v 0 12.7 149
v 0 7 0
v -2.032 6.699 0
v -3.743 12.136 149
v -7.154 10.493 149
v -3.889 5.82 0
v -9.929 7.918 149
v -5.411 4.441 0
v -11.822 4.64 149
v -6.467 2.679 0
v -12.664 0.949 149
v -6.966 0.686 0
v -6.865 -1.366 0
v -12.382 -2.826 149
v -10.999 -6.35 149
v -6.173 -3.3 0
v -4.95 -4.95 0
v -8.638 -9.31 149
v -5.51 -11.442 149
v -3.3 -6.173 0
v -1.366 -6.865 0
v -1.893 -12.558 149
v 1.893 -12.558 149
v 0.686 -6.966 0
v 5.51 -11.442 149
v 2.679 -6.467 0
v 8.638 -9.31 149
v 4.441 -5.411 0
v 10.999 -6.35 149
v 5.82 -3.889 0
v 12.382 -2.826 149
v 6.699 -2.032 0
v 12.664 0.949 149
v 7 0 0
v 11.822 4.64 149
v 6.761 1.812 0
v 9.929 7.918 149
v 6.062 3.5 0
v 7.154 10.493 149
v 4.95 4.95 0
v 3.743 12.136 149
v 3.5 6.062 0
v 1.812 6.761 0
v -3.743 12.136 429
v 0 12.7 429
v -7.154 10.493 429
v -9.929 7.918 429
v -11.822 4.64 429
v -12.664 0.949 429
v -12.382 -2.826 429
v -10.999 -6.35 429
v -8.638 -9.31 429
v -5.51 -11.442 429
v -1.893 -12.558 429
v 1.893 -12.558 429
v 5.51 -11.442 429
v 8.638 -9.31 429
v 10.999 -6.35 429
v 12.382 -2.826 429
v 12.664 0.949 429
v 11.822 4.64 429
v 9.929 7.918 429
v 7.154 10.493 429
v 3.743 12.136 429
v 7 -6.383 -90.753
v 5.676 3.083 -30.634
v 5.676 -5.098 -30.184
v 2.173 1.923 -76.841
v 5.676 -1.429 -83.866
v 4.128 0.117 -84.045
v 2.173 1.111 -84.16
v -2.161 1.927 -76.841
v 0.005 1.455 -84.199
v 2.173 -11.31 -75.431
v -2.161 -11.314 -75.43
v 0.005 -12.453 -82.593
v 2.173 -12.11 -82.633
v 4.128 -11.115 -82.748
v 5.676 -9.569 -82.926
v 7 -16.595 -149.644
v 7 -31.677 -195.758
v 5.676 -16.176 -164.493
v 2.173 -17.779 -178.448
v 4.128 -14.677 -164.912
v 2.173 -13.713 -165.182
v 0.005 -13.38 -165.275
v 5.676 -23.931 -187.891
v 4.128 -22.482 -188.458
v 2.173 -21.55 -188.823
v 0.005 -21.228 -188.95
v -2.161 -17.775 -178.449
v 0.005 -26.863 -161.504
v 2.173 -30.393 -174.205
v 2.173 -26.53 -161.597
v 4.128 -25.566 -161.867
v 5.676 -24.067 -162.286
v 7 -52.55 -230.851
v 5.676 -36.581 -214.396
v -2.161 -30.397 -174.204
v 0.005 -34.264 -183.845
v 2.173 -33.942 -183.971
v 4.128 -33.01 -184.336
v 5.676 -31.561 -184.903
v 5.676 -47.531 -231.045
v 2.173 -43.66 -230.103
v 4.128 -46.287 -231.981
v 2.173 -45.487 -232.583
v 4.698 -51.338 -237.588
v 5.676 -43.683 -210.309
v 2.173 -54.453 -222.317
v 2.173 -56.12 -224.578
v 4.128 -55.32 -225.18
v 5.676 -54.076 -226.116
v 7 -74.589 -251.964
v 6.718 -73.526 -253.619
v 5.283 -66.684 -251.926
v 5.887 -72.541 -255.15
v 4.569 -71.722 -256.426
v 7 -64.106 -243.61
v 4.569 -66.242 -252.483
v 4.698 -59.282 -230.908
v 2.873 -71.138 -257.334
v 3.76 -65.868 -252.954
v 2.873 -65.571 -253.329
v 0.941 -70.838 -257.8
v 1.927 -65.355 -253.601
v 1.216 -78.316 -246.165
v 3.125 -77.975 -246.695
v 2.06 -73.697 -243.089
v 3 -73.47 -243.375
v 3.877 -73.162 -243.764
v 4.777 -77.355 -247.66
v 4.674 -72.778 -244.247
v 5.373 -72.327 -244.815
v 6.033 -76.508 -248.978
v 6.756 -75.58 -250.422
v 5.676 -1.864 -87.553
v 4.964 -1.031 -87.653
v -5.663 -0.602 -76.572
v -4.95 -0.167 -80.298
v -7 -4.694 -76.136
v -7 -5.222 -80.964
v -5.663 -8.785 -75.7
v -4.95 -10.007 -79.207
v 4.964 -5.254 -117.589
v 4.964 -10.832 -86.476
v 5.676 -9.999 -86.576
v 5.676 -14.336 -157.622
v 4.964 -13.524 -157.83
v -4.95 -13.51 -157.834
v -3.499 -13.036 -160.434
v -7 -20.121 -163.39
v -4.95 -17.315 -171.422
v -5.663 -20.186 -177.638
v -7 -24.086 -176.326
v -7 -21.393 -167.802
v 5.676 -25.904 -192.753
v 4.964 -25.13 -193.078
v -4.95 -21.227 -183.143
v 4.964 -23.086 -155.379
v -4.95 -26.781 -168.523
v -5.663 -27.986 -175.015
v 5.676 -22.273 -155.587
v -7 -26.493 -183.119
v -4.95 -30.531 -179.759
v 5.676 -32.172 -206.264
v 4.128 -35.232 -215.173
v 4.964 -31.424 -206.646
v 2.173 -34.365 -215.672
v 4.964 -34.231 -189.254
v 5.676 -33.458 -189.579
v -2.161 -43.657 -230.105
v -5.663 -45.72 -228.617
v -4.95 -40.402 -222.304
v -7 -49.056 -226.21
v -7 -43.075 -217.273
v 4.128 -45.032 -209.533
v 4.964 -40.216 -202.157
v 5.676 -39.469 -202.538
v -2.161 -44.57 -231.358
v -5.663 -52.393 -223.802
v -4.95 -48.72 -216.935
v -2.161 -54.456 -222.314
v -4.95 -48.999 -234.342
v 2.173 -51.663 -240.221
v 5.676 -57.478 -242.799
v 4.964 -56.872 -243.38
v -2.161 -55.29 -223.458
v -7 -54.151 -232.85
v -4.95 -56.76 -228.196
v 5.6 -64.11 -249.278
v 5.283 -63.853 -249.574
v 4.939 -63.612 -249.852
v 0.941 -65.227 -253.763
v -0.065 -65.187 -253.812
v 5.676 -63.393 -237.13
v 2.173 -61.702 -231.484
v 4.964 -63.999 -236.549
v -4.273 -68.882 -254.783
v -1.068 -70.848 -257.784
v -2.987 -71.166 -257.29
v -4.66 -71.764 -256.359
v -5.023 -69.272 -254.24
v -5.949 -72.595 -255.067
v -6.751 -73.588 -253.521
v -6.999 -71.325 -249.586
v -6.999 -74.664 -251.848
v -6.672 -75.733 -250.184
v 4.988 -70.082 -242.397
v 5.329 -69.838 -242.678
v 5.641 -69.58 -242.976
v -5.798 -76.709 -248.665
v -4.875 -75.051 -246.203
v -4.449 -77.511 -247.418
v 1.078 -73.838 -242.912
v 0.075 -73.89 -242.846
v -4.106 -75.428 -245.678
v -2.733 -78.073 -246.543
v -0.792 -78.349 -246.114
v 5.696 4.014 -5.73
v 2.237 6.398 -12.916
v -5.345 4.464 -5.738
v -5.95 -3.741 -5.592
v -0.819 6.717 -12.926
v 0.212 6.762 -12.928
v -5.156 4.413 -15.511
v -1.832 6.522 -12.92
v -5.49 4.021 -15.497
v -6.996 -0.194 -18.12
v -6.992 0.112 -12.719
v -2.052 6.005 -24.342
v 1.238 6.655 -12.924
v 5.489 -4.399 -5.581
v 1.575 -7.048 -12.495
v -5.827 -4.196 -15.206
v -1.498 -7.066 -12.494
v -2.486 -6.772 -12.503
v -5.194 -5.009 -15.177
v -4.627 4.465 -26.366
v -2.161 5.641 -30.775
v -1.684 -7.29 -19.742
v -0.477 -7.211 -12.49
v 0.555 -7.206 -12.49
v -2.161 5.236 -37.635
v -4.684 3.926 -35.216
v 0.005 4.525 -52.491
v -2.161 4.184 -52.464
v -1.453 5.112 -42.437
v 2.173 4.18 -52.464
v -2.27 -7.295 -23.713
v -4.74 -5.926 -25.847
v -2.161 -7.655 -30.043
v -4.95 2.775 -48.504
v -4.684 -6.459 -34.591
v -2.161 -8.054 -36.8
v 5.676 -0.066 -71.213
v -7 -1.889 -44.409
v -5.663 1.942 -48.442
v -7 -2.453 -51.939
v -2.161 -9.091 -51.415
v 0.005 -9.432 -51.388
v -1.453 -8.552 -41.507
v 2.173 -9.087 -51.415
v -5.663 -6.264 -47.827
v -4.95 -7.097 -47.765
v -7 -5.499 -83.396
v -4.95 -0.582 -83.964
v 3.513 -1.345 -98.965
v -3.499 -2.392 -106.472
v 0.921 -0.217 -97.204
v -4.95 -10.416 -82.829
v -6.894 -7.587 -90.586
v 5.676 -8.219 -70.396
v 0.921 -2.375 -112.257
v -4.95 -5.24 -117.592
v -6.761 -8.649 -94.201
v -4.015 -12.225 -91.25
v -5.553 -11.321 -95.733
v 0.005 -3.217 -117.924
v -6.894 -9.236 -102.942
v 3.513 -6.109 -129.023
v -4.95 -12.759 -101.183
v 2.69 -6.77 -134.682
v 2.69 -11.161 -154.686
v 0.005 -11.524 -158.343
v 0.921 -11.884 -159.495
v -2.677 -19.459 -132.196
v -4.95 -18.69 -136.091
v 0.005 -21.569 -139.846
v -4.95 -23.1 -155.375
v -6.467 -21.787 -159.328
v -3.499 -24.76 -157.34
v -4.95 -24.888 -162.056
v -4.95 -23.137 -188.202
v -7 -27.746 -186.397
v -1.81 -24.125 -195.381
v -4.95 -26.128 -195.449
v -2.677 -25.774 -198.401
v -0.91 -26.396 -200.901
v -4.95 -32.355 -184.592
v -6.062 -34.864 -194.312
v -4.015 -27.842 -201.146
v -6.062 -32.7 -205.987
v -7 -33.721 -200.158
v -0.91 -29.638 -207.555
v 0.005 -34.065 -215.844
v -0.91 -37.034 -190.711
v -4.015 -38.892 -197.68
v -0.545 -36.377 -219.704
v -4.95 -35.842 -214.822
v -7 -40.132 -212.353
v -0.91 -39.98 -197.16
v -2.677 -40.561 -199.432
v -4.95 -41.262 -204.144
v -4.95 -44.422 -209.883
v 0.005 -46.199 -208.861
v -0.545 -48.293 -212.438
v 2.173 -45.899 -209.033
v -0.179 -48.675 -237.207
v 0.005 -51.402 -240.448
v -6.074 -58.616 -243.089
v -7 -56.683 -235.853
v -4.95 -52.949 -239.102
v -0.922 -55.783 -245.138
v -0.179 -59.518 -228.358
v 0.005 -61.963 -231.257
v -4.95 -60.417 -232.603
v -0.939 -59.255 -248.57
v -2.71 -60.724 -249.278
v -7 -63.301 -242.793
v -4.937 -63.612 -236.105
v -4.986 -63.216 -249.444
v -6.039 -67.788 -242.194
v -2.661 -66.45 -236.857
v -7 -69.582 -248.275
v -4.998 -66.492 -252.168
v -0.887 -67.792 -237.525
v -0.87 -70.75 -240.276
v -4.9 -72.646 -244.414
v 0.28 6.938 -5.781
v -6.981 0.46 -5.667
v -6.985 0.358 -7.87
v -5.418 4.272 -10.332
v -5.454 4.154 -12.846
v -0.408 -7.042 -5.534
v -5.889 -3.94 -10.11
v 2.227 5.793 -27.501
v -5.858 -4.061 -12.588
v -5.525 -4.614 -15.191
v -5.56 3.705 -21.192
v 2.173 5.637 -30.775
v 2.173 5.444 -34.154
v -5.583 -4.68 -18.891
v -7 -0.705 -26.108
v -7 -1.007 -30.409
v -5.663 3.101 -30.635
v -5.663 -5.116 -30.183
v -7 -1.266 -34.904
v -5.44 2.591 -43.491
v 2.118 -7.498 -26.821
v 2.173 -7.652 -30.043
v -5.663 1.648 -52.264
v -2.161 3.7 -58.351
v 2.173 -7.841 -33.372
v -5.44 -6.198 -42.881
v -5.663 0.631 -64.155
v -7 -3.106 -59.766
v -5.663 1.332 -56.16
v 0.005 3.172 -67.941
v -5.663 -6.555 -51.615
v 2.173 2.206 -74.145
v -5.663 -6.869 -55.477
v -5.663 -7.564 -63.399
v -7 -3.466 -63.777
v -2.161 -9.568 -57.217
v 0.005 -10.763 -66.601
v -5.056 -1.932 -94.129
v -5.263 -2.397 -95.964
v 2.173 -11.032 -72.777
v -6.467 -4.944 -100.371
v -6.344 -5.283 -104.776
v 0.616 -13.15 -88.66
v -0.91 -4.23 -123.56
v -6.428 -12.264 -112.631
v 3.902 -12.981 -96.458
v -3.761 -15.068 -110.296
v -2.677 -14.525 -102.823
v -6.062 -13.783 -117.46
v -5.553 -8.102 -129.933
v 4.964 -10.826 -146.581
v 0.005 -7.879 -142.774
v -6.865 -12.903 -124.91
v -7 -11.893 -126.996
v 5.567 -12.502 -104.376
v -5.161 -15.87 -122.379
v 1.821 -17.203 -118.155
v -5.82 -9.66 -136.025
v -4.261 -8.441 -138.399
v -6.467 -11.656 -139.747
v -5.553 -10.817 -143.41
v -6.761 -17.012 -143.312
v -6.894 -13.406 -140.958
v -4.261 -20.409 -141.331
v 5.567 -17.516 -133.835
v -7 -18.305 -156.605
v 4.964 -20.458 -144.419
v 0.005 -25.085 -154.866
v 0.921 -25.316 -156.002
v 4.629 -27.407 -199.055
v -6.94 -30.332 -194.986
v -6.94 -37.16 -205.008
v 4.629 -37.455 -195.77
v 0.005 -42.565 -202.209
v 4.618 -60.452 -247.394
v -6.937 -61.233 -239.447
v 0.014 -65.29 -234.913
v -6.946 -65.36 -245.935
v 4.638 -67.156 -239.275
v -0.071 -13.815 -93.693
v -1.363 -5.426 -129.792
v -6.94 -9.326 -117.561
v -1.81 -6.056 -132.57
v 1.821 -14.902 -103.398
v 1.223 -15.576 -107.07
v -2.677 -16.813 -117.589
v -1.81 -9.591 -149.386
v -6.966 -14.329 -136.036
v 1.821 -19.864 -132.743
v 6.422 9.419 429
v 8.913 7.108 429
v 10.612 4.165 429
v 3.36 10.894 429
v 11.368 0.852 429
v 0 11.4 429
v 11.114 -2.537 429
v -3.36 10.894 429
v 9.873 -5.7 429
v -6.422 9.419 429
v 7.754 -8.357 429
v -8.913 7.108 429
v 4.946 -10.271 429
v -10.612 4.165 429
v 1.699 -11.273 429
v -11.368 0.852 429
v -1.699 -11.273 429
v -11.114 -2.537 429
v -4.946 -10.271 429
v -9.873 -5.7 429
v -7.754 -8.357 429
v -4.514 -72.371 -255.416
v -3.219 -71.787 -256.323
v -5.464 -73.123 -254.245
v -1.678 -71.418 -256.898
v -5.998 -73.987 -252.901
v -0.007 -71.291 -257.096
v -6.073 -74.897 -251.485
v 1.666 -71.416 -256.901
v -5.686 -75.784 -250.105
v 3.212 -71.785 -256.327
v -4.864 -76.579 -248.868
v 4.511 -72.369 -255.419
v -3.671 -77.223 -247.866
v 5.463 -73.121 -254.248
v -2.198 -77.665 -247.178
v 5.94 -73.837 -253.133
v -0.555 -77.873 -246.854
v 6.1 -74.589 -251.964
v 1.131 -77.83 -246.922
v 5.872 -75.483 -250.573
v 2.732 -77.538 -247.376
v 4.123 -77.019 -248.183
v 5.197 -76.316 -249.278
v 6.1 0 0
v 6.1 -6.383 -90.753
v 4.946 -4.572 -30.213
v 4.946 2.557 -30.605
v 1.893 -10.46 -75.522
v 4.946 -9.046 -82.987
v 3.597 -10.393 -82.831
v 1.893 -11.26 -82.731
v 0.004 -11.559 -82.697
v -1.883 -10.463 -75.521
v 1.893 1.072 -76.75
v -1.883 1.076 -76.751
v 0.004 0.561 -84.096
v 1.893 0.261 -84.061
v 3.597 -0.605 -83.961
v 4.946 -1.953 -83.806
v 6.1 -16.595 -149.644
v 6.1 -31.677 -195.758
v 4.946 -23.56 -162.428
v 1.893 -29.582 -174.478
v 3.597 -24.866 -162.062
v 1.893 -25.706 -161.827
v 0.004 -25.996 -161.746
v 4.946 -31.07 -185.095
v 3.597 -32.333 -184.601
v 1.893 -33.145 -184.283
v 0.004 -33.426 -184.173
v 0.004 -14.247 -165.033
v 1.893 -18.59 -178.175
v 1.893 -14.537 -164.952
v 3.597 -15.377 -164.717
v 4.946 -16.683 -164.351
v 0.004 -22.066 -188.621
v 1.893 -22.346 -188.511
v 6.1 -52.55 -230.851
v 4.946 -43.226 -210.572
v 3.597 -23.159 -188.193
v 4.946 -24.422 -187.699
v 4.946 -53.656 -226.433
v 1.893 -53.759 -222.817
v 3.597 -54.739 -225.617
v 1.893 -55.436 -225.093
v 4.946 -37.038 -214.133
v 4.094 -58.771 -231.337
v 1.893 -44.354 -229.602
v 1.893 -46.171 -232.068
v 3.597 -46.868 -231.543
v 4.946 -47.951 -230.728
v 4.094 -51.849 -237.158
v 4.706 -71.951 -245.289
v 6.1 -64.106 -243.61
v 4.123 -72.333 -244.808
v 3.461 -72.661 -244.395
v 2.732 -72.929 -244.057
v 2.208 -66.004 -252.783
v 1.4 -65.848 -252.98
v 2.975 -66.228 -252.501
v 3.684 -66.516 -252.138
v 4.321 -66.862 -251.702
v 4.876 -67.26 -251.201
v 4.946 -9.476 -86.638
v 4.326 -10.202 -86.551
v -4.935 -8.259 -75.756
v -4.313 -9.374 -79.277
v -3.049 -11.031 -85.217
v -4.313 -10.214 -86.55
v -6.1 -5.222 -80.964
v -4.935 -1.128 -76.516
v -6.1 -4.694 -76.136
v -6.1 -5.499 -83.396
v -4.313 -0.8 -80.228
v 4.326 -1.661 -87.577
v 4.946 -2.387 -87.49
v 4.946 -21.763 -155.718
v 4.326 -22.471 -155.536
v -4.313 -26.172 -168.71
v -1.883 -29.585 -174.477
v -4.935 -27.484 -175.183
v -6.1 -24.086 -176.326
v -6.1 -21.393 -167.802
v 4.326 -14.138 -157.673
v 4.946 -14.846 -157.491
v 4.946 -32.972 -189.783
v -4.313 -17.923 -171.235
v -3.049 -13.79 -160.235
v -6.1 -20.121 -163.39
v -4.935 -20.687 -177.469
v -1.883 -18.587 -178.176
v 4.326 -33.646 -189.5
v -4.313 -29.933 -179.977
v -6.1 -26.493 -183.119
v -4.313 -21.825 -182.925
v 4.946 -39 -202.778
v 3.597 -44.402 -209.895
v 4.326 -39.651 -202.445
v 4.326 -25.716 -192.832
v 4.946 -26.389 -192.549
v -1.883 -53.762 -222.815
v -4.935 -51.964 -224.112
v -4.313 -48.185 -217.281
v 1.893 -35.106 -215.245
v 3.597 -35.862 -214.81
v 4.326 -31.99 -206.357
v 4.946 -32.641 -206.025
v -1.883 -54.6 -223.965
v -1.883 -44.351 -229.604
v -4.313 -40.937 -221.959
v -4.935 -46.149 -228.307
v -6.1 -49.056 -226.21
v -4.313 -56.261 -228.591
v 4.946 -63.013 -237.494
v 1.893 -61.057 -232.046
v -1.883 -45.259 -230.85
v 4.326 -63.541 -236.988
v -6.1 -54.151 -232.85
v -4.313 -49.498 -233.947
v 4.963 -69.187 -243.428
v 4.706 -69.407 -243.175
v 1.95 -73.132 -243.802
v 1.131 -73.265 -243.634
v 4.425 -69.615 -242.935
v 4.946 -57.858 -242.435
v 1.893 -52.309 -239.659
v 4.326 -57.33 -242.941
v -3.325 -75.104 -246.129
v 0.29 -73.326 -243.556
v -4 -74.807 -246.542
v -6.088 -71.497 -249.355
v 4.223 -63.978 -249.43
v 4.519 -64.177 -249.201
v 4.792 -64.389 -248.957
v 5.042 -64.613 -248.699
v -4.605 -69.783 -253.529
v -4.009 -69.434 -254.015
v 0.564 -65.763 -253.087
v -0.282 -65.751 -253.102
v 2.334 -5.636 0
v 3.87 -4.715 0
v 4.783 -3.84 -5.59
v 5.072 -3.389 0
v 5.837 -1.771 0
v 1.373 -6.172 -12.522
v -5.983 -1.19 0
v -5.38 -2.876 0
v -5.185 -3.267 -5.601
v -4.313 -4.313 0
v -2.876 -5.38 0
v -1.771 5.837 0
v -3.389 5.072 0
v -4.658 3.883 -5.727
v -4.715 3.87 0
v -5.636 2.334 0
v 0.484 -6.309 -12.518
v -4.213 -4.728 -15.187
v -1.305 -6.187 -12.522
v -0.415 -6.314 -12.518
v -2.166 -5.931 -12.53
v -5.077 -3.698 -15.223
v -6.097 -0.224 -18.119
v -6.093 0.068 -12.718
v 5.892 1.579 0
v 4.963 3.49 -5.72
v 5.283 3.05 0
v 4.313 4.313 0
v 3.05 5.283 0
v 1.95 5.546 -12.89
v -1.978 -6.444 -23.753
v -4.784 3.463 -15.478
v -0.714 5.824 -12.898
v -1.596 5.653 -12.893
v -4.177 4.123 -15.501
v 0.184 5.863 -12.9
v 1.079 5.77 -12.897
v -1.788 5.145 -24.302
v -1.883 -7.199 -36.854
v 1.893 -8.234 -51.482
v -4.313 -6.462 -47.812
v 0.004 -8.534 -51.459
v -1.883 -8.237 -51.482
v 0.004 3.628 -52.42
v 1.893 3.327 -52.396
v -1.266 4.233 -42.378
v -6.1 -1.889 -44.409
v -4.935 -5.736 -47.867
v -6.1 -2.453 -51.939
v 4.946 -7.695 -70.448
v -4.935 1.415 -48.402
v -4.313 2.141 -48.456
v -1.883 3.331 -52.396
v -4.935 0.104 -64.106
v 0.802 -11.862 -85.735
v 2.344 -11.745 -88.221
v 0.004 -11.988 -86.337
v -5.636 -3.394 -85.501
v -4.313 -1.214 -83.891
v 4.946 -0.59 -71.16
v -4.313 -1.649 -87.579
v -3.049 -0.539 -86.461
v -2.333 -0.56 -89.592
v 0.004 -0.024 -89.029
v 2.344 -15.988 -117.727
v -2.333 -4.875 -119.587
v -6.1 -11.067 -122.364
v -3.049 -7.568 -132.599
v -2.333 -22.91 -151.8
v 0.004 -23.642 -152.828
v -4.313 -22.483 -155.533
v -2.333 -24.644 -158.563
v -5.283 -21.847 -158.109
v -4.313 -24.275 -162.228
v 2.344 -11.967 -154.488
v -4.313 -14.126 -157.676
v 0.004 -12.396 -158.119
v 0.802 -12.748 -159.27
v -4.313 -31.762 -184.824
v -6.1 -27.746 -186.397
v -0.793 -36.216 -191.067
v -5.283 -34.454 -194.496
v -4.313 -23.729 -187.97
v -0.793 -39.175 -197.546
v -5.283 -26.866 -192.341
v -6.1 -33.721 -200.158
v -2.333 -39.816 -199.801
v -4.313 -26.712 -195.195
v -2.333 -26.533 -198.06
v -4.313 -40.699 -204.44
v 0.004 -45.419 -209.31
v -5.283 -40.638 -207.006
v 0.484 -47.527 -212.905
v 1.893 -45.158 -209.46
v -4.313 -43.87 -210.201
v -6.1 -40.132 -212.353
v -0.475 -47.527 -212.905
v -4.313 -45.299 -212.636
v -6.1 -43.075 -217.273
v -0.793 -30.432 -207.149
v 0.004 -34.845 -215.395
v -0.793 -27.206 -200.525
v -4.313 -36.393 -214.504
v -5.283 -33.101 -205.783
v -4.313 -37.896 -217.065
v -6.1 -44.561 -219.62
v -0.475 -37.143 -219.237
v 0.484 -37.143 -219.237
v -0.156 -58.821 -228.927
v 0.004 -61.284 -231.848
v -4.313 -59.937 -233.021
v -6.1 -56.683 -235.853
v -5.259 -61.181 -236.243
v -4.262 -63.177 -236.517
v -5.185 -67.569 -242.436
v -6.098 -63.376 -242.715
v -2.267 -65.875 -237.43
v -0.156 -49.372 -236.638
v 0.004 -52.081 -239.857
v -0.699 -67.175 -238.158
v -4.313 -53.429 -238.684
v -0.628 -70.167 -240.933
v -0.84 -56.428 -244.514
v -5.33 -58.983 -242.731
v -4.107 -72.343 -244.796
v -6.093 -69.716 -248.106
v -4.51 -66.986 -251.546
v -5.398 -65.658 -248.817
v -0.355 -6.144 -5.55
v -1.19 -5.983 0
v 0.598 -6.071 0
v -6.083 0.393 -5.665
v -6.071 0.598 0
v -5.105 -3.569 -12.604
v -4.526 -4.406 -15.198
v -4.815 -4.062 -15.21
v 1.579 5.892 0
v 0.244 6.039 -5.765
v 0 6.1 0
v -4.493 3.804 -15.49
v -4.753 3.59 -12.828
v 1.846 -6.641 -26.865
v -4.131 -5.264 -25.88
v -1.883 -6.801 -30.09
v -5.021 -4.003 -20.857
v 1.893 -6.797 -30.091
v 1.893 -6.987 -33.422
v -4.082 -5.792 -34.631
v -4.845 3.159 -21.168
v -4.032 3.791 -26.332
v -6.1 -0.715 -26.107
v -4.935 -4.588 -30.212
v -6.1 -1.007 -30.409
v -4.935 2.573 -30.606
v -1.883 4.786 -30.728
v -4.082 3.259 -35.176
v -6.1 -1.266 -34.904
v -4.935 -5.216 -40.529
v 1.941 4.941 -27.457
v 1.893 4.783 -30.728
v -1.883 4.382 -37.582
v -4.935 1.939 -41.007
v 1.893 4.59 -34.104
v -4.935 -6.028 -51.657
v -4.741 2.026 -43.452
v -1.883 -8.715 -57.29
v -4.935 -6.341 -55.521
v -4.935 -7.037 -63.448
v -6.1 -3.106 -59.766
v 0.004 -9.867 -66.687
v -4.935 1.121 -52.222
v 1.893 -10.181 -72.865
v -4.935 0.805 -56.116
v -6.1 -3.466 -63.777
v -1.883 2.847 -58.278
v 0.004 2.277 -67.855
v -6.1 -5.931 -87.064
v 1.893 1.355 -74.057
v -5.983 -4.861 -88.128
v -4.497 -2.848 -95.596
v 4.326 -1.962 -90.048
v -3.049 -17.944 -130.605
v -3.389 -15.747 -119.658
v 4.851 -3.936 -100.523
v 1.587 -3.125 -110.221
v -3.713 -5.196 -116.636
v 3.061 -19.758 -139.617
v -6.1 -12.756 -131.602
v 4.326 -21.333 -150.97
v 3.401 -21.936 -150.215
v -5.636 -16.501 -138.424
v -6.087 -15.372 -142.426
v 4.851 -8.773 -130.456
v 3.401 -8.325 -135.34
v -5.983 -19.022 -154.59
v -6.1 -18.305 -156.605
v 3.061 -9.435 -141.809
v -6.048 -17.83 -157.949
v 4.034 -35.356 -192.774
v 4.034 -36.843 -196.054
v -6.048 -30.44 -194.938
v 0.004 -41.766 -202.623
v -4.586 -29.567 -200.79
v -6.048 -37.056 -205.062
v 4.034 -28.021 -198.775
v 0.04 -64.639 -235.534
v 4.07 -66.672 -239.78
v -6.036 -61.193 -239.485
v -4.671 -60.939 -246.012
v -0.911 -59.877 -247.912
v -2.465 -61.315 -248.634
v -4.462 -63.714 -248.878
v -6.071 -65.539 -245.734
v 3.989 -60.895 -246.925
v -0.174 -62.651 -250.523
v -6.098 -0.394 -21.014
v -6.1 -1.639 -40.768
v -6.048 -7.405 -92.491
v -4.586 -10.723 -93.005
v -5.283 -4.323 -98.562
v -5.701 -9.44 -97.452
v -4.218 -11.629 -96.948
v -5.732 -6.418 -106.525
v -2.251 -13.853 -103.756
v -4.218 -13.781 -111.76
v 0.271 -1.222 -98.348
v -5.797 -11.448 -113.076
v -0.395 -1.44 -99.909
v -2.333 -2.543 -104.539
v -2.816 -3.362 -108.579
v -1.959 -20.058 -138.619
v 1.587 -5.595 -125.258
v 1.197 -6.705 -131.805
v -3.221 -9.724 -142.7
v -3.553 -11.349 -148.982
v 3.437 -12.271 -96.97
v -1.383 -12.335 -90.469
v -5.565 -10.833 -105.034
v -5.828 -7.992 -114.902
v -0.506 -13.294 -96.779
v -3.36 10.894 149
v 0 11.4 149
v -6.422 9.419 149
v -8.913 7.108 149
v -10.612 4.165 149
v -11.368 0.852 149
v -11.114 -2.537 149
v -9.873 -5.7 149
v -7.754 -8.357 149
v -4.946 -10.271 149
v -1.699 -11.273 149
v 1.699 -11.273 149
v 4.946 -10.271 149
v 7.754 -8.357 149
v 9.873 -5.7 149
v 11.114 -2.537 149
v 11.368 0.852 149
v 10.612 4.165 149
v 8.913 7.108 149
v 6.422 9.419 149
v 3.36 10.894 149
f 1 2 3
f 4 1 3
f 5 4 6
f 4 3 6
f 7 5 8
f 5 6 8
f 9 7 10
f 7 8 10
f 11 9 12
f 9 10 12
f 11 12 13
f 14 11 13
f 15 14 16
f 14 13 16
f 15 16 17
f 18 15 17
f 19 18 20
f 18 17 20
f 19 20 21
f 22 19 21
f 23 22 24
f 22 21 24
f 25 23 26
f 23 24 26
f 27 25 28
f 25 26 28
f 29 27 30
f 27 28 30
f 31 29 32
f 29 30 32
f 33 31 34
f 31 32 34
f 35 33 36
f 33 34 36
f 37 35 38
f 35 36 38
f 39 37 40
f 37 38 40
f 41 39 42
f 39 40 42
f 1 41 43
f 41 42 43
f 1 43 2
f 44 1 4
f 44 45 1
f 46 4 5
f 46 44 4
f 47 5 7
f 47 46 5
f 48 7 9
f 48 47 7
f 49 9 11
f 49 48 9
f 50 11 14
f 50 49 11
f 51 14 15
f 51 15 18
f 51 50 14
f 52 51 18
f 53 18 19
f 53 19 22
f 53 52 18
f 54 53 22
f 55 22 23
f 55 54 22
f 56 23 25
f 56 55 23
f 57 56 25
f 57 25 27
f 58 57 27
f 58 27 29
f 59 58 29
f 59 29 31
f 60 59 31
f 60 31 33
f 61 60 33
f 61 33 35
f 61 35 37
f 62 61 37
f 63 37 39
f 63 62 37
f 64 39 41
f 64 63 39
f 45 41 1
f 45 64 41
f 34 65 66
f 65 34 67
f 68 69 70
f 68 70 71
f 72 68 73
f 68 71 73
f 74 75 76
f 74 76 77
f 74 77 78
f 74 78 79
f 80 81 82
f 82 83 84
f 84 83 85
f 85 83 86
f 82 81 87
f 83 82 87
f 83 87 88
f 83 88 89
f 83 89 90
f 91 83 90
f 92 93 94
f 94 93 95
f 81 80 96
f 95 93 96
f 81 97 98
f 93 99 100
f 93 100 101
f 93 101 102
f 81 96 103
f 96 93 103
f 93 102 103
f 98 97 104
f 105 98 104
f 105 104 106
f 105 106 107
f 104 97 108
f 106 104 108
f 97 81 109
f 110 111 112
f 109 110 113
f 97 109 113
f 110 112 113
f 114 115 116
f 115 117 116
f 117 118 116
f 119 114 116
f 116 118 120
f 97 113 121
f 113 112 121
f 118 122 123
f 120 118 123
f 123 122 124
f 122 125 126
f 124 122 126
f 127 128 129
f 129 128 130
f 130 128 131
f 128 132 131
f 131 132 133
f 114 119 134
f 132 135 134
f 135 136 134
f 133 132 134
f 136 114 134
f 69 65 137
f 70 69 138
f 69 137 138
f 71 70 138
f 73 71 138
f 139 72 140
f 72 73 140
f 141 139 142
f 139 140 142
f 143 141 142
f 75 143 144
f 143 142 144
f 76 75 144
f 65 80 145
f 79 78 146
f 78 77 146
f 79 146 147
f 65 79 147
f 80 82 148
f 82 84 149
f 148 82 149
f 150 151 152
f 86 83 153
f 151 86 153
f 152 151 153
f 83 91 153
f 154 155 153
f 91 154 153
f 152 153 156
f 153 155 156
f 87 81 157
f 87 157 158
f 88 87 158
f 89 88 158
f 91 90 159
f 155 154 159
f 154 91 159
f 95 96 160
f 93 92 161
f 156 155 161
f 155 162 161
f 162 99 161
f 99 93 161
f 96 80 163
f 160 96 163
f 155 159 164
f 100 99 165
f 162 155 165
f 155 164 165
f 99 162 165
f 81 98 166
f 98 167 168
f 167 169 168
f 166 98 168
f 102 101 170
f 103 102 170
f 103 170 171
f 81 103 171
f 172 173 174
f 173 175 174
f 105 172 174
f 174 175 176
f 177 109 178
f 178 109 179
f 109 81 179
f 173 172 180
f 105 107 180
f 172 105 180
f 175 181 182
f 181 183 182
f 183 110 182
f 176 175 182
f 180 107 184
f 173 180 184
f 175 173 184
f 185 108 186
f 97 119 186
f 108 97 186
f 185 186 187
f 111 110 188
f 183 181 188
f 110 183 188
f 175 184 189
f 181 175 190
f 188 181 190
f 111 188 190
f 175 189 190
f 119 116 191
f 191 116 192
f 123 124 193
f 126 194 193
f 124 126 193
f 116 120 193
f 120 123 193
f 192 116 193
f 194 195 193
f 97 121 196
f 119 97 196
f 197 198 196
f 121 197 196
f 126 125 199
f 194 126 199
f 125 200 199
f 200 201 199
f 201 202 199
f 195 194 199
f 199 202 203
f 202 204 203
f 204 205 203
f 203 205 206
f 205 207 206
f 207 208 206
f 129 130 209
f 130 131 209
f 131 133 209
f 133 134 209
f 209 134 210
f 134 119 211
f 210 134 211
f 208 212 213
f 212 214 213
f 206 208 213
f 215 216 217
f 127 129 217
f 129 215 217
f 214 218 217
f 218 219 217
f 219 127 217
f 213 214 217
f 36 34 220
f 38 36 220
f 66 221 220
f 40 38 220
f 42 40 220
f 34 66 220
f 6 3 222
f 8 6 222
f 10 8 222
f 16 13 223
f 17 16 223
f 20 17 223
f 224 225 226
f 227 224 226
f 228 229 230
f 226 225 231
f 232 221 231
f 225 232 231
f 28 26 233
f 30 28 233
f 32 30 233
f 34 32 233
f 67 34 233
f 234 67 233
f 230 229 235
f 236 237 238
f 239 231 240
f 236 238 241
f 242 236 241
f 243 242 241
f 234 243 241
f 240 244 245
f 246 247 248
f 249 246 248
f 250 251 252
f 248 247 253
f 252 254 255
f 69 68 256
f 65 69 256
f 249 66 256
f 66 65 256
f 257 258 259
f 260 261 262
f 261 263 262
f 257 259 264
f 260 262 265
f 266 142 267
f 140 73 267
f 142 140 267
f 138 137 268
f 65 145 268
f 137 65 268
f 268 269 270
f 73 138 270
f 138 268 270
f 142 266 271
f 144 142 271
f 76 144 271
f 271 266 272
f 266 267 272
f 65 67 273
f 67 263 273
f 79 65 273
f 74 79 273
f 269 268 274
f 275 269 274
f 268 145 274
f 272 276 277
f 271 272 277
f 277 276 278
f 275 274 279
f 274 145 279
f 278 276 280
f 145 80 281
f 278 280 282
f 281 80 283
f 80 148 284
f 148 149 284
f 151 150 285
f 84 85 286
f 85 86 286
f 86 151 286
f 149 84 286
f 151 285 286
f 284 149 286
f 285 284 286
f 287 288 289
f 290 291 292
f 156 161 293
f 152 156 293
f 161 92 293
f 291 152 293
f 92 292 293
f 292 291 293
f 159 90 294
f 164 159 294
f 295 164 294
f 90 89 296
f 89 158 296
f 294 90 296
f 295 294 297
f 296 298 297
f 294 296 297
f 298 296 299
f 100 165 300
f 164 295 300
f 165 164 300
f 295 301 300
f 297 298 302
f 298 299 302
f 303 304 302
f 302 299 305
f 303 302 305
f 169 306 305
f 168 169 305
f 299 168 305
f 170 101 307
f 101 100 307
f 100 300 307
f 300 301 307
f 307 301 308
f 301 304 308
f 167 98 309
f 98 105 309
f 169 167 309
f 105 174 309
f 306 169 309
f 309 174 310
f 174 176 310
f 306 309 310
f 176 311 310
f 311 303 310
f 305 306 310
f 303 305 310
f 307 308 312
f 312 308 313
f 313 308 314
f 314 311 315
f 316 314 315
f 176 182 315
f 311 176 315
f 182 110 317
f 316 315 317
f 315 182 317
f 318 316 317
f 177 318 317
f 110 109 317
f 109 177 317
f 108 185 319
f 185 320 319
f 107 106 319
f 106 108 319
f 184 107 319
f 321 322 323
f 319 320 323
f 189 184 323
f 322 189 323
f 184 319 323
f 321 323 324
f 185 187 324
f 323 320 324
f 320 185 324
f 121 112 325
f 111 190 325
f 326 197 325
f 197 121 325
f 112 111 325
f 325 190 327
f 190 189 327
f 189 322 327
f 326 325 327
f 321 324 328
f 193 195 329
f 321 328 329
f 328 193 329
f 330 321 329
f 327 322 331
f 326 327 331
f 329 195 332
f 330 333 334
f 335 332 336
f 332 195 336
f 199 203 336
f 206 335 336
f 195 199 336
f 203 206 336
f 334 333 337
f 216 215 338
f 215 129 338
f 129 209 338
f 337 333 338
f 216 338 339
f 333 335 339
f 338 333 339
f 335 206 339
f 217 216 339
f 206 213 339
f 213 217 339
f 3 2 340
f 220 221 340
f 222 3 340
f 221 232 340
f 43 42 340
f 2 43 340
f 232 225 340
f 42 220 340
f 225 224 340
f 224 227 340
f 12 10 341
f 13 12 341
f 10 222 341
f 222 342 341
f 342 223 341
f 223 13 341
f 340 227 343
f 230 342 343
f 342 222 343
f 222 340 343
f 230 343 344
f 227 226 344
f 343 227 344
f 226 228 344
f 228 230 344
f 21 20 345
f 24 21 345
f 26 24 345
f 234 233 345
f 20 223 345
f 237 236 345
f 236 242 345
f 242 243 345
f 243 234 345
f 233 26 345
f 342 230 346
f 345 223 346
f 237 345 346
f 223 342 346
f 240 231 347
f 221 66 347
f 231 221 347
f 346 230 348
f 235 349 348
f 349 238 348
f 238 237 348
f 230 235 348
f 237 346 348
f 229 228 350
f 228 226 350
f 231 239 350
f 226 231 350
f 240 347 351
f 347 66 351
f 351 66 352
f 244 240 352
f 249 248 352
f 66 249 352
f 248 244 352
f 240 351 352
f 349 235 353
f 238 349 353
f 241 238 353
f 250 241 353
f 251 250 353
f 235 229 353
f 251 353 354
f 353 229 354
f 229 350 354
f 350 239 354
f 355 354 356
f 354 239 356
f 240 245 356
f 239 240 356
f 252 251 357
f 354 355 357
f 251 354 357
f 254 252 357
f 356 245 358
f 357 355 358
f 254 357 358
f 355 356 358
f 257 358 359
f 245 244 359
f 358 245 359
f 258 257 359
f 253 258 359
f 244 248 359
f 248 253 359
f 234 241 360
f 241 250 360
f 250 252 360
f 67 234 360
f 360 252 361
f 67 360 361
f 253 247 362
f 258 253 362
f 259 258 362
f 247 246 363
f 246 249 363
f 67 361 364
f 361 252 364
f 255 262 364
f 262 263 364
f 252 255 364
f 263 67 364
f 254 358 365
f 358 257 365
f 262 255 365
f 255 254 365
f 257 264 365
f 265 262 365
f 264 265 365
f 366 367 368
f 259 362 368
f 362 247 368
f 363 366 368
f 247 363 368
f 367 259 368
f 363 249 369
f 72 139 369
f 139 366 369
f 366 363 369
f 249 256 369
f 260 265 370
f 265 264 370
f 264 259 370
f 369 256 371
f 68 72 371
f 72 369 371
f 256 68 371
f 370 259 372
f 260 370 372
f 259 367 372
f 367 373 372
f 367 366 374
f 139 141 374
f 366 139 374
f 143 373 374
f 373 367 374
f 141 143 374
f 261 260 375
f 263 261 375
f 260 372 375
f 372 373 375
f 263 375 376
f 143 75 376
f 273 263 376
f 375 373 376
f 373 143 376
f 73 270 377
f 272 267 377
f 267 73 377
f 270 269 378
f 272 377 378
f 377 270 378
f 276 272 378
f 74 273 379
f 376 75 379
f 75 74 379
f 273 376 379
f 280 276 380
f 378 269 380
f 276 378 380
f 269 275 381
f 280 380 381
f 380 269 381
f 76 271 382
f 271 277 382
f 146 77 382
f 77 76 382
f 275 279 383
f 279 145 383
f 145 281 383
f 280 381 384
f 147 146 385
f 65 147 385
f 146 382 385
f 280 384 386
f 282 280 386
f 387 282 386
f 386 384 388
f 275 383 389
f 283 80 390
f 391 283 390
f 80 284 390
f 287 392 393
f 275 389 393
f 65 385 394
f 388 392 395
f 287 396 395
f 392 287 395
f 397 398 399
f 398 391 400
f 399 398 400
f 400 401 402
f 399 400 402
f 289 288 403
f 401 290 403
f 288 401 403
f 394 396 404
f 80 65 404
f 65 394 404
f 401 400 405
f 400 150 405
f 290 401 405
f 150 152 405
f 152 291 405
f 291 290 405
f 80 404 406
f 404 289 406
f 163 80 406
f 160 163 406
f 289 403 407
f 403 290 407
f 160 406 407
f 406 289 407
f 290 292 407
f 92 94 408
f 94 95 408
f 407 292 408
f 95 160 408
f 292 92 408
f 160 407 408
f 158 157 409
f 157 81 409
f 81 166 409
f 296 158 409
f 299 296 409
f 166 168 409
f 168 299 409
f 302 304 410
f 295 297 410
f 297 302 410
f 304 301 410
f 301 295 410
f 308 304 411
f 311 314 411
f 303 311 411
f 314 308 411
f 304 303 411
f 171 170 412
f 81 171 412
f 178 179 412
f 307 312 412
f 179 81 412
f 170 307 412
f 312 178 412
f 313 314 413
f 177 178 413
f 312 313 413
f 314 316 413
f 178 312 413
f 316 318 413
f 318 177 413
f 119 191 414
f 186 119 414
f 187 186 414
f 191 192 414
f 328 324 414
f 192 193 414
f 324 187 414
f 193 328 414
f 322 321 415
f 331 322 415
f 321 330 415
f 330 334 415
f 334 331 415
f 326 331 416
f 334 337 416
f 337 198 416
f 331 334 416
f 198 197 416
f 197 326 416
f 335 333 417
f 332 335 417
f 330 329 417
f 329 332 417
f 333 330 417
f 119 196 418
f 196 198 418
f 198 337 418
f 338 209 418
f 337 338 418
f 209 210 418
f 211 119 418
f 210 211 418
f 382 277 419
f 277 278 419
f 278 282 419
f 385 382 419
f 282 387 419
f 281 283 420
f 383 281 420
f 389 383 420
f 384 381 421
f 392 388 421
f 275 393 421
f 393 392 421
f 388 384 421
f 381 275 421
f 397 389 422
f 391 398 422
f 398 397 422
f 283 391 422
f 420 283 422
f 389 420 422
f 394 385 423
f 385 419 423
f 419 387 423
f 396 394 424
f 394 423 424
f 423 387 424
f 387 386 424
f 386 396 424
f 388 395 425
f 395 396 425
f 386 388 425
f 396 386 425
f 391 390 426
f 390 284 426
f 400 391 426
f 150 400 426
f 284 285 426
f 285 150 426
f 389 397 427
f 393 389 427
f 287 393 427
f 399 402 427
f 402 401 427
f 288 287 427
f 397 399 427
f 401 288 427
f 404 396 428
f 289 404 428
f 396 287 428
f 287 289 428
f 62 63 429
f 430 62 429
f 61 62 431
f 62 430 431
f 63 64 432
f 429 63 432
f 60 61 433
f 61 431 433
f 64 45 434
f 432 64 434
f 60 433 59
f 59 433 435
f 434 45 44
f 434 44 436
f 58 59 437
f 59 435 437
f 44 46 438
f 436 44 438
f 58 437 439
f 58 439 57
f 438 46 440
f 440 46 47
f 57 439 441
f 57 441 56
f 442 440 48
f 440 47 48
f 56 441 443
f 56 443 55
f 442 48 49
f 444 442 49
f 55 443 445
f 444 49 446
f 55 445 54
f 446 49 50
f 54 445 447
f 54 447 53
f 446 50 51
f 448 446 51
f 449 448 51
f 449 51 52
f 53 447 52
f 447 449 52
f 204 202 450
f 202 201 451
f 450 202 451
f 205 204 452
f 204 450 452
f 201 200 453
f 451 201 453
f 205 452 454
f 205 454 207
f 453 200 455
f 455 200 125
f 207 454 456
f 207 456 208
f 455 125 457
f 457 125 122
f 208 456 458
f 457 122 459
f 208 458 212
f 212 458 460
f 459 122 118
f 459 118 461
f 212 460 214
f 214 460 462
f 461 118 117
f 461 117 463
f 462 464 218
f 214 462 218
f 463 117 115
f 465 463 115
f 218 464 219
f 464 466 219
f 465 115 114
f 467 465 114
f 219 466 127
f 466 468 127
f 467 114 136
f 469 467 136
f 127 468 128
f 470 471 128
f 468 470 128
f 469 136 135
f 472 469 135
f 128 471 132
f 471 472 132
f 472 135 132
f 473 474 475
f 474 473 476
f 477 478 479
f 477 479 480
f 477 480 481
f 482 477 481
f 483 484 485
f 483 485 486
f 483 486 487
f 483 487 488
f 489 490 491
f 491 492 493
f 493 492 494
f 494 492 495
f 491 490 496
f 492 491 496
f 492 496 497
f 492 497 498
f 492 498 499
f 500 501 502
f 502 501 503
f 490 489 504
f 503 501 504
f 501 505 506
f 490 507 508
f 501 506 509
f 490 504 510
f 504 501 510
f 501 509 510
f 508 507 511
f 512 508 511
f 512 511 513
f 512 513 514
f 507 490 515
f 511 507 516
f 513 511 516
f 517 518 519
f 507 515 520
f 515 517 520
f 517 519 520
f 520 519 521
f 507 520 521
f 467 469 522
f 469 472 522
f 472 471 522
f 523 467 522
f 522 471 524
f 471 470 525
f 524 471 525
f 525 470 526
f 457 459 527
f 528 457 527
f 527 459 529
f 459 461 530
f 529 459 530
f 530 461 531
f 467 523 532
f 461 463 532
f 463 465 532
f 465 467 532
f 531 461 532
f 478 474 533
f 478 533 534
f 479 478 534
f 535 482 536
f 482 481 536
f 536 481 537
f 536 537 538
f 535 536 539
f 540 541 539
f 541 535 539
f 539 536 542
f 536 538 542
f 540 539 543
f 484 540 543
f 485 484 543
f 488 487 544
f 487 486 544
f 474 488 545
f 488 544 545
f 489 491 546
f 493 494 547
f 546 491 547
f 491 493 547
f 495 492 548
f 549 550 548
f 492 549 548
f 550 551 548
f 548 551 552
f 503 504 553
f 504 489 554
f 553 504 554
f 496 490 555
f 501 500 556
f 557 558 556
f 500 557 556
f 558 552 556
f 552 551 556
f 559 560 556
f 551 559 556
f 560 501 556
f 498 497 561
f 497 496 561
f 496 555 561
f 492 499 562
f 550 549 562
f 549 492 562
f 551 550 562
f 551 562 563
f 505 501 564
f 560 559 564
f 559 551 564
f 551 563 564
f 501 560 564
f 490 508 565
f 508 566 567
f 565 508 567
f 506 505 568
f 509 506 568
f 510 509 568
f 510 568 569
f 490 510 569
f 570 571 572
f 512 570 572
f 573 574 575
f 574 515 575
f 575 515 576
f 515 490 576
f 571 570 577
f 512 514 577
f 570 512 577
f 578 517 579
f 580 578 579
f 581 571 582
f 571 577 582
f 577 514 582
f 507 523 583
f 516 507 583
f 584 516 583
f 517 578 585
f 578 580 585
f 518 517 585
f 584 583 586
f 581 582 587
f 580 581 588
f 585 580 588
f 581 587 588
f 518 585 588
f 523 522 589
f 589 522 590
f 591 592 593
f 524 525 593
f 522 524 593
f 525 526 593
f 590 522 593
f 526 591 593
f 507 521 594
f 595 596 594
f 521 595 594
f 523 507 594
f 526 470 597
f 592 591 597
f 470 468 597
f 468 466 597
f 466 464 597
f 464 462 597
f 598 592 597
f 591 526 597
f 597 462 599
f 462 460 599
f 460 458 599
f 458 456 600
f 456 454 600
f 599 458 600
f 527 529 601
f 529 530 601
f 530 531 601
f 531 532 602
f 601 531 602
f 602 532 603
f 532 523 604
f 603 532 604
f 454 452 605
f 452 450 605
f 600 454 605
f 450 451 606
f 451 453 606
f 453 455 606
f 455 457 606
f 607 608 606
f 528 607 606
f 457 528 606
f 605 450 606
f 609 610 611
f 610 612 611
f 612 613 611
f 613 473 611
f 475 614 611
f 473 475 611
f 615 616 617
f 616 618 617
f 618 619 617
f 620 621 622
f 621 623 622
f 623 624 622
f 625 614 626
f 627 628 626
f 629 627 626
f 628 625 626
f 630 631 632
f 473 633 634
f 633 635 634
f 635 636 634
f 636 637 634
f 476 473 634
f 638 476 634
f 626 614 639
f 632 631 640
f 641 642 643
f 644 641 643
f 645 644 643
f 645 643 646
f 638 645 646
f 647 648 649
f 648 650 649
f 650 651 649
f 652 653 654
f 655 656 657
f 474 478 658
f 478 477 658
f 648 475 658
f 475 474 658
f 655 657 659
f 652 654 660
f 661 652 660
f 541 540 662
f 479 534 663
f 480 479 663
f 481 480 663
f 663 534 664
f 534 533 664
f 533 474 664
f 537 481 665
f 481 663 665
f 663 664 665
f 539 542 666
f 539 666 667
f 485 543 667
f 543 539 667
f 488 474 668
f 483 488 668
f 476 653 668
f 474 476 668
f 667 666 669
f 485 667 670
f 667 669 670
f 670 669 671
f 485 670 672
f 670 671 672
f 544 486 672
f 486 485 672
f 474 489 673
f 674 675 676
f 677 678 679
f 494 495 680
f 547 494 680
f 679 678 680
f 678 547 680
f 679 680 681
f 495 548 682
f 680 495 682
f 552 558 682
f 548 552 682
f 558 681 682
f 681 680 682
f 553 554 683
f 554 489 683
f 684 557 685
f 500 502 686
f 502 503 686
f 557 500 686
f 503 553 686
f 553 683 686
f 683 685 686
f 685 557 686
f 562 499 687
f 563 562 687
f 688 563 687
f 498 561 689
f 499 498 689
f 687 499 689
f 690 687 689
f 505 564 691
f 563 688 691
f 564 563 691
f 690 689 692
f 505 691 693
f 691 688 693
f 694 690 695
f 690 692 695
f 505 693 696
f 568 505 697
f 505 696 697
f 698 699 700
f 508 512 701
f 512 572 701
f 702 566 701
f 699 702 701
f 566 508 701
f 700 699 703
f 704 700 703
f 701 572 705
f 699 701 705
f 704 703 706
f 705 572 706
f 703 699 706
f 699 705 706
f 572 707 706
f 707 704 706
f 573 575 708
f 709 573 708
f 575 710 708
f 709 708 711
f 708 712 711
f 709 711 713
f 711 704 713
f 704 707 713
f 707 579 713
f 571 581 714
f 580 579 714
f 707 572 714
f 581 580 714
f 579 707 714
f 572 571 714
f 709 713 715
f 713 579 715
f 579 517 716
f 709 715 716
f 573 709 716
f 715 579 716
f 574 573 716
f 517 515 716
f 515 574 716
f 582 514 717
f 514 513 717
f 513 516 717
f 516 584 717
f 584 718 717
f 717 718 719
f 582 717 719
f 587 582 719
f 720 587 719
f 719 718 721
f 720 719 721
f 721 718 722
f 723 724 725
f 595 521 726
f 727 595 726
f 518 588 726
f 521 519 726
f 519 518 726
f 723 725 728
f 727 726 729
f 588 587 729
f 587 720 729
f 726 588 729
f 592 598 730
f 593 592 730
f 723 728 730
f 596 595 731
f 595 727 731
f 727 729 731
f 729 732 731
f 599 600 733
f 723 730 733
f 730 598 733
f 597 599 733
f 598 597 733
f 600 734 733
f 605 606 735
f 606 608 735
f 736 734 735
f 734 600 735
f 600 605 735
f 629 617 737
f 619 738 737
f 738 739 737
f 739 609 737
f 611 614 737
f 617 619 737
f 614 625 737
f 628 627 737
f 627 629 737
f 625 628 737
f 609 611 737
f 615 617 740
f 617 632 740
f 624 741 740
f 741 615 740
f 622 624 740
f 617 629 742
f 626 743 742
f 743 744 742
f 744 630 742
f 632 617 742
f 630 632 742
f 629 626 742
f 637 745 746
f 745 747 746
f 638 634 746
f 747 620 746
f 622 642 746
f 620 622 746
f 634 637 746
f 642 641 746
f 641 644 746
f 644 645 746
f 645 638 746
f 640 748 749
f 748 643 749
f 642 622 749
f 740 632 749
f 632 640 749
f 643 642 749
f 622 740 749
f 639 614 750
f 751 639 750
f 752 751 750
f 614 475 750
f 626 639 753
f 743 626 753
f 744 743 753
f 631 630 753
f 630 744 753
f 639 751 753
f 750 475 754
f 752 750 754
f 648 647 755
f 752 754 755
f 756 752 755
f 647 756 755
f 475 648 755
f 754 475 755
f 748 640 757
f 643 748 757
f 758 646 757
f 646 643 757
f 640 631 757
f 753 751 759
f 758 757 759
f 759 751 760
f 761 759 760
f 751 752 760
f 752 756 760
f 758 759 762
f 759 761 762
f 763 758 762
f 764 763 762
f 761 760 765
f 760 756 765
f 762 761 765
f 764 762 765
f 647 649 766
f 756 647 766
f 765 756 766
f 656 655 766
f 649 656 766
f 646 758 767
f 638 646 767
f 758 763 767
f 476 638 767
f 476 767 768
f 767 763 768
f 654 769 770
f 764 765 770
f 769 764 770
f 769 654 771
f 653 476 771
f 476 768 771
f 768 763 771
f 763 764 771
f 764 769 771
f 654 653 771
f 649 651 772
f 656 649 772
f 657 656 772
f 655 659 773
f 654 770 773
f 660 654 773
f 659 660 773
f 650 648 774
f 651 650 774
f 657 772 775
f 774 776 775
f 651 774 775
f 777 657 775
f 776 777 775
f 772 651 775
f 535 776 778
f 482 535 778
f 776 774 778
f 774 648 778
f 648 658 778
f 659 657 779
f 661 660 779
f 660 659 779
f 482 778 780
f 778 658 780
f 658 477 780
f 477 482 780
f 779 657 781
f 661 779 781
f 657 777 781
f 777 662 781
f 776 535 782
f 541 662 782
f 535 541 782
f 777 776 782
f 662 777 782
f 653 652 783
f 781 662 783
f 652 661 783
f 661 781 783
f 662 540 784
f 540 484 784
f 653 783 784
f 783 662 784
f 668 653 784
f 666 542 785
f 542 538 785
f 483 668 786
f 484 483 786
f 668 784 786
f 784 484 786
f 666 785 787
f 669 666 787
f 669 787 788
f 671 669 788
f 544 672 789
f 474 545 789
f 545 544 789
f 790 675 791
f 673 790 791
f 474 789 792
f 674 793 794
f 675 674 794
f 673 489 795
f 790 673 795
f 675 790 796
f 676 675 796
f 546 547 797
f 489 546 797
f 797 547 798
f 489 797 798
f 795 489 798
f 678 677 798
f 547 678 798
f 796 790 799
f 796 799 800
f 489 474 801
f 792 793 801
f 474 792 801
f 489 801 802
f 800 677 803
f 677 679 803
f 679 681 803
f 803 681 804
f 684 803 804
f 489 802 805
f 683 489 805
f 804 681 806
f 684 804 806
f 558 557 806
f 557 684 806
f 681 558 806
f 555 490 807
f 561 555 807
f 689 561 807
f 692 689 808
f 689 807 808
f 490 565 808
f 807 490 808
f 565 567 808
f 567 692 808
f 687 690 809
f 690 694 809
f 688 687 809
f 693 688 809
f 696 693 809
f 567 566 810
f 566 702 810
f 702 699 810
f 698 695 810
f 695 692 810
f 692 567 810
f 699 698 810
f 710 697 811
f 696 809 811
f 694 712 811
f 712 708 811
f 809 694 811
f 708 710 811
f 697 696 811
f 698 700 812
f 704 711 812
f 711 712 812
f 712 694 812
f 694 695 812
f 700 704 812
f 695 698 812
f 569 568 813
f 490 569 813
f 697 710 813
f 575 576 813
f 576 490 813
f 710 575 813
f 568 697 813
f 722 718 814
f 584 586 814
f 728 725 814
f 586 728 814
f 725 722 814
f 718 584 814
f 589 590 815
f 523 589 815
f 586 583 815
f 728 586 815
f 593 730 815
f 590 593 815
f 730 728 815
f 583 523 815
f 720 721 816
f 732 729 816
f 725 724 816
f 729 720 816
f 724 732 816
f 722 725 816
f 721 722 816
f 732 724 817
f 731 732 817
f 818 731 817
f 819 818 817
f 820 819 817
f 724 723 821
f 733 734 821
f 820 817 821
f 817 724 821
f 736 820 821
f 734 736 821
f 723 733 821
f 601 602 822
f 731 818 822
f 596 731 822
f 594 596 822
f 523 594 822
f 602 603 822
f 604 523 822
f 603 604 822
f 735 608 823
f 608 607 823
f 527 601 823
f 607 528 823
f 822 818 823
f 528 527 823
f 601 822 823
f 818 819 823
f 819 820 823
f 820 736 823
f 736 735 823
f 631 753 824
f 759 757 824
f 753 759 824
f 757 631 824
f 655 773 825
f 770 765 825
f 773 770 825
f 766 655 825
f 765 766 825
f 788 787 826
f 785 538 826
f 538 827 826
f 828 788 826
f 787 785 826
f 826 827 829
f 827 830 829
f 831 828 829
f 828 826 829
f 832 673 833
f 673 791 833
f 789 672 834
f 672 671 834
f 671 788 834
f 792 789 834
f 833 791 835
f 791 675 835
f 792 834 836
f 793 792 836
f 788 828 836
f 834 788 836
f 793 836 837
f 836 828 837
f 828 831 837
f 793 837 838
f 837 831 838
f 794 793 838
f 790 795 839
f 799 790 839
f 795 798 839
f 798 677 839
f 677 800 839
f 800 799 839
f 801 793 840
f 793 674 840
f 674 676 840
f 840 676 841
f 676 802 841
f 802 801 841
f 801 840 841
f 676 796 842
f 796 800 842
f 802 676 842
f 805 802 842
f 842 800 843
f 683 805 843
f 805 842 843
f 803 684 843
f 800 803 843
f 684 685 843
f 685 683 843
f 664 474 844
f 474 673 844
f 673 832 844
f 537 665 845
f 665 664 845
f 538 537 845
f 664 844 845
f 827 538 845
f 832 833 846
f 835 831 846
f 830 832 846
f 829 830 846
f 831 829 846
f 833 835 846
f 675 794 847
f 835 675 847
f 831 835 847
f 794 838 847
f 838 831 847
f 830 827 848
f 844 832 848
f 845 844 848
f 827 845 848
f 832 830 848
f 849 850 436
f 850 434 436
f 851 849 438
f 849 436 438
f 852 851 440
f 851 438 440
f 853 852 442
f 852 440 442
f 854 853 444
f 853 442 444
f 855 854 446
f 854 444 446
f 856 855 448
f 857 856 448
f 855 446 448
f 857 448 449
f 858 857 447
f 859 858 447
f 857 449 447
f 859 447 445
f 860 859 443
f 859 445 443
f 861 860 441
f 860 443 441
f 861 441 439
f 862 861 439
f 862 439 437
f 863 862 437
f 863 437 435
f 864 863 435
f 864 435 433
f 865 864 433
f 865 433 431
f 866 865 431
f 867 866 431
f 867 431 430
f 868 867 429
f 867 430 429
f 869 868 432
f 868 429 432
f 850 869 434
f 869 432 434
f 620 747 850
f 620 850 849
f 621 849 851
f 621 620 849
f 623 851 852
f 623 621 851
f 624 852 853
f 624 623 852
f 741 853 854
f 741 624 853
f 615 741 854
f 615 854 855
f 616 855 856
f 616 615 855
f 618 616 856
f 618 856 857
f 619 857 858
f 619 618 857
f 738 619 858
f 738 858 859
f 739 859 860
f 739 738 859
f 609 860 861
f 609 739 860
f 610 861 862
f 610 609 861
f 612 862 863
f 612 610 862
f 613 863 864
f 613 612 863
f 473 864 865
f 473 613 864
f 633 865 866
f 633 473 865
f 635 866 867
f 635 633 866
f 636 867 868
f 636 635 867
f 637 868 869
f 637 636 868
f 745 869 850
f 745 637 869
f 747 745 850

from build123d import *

# Parameters (mm, degrees)
F0_W   = 1.3
F0_H   = 280
F2_R   = 7
F2_R_2 = 6.1


with BuildPart() as f1:
    # F0 (on Right) → F1 (revolve)
    with BuildSketch(Plane.YZ):
        with Locations((12.05, 289)):
            Rectangle(F0_W, F0_H)
        with BuildLine():
            Line((12.7, 149), (11.4, 149))
            add(Edge.make_bspline(
                [(11.4, 149), (11.4, 92.4578085542), (6.1, 66.6295662522), (6.1, 0)],
                knots=[0, 0, 0, 0, 149.0942319474, 149.0942319474, 149.0942319474, 149.0942319474], degree=3))
            Line((6.1, 0), (7, 0))
            add(Edge.make_bspline(
                [(12.7, 149), (12.7, 92.2850742936), (7, 66.6657984257), (7, 0)],
                knots=[0, 0, 0, 0, 149.108986986, 149.108986986, 149.108986986, 149.108986986], degree=3))
        make_face()
    revolve(axis=Axis((0, 0, 214.5), (0, 0, 1)))

    # F4: sweep along a path in F3
    with BuildLine(Plane.YZ) as f4_path:
        add(Plane.YZ * Edge.make_bspline(
            [(0, 0), (0, -26.1989749136), (-7.6955910716, -183.7199925036), (-59.8292611539, -242.4782961607), (-74.5888213685, -251.9644491406)],
            knots=[0, 0, 0, 0, 0.5831318208, 1, 1, 1, 1], degree=3))
    # F2 (on Top) → F4 (sweep)
    with BuildSketch(Plane.XY):
        Circle(F2_R)
        Circle(F2_R_2, mode=Mode.SUBTRACT)
    sweep(path=f4_path.line)


solid = f1.part
